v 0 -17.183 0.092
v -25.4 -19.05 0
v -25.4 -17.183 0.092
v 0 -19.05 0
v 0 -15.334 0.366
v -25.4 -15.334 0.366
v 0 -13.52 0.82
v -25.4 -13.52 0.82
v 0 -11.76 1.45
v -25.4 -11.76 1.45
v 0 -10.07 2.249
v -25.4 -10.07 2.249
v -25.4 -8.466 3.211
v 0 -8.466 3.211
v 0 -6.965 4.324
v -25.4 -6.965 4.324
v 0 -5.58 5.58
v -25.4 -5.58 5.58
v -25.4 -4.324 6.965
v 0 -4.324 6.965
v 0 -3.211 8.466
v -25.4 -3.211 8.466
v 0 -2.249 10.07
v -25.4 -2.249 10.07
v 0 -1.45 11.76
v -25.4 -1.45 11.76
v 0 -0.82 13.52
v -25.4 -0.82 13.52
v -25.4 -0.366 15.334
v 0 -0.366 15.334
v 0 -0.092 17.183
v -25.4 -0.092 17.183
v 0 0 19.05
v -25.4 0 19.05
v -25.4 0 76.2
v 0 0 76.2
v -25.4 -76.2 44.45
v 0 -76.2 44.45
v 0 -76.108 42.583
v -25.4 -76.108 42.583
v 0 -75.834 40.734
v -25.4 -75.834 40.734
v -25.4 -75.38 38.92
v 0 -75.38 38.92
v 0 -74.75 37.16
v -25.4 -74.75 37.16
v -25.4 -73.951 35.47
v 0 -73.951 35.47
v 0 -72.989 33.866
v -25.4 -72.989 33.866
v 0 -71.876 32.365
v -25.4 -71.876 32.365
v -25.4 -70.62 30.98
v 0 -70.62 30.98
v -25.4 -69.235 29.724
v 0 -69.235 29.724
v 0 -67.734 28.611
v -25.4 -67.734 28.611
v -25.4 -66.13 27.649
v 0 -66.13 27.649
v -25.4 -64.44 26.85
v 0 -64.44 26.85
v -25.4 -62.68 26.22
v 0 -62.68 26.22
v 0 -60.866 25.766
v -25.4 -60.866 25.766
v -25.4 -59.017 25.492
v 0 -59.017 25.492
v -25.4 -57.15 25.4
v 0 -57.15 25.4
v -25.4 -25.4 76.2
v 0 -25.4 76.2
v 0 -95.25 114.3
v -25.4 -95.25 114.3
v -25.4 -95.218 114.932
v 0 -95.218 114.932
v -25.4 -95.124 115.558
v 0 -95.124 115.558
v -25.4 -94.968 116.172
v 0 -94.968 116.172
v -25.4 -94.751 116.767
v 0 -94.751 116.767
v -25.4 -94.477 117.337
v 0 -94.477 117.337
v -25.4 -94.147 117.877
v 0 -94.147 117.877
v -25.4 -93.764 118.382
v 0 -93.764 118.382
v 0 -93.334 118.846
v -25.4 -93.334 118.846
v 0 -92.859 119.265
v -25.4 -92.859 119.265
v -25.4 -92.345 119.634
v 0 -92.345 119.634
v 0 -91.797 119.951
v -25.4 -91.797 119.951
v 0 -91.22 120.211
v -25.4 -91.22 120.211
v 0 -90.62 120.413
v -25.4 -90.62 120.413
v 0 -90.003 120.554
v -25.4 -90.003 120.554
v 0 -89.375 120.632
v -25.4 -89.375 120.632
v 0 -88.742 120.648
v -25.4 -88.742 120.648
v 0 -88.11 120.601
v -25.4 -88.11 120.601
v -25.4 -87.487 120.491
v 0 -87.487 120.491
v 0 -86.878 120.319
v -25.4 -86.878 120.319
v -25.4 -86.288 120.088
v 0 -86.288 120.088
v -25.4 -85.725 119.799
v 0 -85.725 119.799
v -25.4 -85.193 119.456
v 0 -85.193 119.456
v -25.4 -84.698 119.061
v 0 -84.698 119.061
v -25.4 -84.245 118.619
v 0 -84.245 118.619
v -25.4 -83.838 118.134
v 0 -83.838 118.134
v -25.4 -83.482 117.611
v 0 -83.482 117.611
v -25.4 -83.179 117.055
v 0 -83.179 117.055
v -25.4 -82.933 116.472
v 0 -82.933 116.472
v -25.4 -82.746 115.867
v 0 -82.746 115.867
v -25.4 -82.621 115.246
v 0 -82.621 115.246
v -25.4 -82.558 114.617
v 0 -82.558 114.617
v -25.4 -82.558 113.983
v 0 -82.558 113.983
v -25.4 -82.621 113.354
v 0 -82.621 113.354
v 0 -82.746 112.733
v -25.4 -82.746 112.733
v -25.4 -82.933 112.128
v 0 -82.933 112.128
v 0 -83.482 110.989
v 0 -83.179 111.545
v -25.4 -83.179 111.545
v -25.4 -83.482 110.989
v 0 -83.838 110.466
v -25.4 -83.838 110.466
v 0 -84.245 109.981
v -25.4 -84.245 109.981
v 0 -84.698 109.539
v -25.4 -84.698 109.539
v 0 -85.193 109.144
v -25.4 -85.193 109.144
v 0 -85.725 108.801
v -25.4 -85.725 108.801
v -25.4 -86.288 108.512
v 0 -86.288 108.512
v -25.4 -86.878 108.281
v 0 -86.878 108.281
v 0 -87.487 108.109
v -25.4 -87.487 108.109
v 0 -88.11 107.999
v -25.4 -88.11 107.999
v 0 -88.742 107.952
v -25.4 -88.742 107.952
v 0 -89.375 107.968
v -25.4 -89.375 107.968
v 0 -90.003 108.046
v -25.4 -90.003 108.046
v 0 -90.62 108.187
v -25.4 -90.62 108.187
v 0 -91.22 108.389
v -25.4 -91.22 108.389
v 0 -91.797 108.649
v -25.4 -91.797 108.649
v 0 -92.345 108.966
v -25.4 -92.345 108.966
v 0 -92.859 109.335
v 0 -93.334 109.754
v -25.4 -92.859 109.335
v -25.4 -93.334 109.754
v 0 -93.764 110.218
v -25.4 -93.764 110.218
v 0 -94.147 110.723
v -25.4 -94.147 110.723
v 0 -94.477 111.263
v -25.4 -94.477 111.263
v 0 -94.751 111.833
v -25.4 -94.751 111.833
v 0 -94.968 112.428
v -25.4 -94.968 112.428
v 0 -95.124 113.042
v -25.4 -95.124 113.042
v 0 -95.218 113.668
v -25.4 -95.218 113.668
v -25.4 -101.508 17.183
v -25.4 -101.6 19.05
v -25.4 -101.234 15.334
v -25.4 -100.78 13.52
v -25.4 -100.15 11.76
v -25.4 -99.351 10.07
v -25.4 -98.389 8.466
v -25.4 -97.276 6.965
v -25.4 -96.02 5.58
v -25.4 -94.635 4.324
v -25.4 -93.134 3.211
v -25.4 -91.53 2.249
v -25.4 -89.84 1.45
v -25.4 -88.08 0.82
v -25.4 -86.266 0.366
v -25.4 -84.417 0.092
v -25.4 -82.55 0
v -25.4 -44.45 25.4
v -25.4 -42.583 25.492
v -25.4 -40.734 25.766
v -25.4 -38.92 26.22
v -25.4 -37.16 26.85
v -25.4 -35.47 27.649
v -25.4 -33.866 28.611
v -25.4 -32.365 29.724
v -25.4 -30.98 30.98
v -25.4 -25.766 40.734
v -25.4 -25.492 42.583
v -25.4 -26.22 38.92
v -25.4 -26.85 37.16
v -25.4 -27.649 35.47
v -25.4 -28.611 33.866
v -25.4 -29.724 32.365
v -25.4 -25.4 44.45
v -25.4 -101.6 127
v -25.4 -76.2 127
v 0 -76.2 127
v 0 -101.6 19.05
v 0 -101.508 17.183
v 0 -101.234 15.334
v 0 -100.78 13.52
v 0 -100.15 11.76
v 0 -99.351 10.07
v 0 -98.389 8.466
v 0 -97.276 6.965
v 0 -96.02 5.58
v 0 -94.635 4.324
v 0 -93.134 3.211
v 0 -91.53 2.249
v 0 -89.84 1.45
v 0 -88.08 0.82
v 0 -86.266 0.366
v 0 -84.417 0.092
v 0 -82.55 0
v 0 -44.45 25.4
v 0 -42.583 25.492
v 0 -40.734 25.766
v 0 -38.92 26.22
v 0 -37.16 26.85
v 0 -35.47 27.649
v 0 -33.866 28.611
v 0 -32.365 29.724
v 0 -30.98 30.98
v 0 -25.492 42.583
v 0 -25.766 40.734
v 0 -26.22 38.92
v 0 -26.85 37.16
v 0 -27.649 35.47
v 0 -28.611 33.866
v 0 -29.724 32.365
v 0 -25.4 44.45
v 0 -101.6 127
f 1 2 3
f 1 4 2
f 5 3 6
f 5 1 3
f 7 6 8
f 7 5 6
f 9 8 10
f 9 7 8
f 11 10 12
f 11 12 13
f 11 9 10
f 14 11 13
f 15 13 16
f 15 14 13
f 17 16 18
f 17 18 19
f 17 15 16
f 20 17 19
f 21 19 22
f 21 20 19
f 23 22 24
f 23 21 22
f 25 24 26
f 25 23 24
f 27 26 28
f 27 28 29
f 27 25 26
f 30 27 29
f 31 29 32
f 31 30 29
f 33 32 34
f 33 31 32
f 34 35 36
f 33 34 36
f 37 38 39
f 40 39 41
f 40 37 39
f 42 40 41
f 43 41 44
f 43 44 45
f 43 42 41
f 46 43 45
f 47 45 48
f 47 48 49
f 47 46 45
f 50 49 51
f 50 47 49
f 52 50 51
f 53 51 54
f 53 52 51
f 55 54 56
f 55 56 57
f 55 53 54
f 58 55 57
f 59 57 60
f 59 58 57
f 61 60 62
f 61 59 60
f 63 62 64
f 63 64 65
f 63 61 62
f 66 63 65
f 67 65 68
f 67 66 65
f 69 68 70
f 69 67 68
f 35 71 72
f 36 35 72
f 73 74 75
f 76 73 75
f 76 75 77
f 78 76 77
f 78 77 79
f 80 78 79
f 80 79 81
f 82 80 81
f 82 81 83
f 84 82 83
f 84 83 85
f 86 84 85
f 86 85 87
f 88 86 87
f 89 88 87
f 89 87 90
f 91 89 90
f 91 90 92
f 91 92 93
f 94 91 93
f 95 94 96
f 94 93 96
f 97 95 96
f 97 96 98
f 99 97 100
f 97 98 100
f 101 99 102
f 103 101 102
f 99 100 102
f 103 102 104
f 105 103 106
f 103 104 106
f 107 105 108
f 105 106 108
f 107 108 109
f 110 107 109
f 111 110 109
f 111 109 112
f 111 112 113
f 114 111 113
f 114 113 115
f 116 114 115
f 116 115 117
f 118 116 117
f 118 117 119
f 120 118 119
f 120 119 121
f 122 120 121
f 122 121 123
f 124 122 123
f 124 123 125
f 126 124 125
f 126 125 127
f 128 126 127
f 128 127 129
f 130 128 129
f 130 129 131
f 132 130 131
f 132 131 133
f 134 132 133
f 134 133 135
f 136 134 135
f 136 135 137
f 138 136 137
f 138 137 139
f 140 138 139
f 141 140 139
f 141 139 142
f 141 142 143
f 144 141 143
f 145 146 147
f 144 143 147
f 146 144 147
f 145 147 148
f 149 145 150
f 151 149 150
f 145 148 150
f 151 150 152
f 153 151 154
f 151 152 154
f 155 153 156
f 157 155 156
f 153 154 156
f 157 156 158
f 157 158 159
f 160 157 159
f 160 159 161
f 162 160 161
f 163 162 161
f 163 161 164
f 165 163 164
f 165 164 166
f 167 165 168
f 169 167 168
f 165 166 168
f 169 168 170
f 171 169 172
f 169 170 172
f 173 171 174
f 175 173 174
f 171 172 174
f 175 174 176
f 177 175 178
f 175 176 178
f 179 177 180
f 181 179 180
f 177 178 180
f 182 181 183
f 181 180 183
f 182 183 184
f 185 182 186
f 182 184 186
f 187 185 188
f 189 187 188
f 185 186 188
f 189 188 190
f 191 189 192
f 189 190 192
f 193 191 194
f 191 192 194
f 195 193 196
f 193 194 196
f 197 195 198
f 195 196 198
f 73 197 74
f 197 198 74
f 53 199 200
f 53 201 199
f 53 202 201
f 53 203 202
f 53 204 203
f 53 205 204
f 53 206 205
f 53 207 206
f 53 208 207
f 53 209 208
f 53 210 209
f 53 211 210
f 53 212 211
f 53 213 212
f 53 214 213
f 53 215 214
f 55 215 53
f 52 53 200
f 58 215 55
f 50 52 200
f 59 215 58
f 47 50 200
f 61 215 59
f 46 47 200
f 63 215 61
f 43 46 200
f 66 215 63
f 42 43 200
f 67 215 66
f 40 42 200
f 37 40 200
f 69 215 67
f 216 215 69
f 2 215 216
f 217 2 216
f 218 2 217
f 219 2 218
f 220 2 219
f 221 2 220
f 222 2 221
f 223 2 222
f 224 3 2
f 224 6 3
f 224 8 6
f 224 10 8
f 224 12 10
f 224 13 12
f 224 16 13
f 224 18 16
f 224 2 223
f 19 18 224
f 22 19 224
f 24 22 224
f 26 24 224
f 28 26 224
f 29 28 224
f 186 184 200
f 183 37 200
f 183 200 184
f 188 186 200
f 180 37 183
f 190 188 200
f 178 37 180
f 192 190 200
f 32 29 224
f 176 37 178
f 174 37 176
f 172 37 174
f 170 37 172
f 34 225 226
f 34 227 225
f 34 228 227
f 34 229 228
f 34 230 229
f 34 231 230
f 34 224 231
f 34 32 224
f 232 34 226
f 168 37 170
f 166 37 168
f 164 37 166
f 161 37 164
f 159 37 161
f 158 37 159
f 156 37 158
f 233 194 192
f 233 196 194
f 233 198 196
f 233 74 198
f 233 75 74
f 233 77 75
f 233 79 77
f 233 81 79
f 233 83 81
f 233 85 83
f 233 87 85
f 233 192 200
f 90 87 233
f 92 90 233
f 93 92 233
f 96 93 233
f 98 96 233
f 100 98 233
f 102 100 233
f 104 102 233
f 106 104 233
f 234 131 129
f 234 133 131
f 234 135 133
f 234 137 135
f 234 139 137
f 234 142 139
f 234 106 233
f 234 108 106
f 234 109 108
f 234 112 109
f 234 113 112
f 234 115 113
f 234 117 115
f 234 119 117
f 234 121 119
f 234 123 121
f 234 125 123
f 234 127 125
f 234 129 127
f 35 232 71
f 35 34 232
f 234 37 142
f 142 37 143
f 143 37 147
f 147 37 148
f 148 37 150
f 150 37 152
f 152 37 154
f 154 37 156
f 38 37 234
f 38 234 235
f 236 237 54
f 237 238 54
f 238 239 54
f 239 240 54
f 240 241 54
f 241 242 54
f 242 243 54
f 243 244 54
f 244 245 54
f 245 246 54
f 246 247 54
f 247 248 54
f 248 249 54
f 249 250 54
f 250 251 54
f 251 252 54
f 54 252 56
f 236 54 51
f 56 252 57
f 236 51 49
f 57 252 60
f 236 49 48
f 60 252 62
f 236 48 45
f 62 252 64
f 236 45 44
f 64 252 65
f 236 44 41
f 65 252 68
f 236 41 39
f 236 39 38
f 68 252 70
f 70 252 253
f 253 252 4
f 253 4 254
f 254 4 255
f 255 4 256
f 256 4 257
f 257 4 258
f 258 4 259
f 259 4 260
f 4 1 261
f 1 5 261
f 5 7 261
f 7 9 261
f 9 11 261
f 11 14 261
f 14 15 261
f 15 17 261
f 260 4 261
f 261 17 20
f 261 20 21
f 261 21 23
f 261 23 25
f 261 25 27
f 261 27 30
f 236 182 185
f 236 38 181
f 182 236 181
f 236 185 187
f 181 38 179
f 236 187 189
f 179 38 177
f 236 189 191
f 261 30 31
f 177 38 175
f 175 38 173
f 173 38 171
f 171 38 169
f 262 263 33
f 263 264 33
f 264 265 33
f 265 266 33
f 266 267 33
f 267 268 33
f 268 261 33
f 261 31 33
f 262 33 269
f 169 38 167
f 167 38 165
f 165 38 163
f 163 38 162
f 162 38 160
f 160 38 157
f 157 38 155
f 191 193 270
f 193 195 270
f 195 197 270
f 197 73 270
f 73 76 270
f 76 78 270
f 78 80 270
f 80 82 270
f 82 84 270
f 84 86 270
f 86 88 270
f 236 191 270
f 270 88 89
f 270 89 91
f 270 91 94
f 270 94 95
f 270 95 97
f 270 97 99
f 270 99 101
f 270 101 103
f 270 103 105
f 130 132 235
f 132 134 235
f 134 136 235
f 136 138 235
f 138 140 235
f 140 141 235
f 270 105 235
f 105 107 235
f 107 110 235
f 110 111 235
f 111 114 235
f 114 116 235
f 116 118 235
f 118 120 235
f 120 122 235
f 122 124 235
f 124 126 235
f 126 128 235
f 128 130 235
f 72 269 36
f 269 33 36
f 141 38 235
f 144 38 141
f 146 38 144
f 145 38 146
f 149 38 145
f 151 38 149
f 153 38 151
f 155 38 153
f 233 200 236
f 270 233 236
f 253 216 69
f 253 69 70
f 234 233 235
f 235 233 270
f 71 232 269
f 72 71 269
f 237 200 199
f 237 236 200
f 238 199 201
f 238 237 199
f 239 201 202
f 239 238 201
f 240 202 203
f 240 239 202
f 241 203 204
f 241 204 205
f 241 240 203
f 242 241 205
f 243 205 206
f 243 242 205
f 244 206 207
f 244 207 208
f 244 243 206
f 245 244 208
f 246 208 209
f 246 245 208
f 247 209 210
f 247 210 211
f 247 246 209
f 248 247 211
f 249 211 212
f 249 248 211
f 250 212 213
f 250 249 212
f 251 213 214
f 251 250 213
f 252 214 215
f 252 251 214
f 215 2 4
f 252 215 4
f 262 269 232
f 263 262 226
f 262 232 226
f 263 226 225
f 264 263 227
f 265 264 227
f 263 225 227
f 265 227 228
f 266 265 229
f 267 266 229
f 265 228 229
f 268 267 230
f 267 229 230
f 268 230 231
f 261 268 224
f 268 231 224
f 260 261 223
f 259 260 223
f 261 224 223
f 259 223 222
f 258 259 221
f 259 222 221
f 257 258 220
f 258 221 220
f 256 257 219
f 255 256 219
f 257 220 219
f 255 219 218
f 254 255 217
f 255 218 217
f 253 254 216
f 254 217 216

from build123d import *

# Parameters (mm, degrees)
F0_W     = 25.4
F0_H     = 25.4
F1_DEPTH = 101.6
F2_W     = 25.4
F2_H     = 25.4
F3_DEPTH = 127
F4_W     = 25.4
F4_H     = 25.4
F5_DEPTH = 76.2
F7_D     = 12.7
F8_R     = 19.05
F9_R     = 19.05
F10_R    = 19.05
F11_R    = 19.05


with BuildPart() as f1:
    # F0 (on Front) → F1 (new body)
    with BuildSketch(Plane.XZ):
        with Locations((-12.7, 12.7)):
            Rectangle(F0_W, F0_H)
    extrude(amount=F1_DEPTH)

    # F2 (on face) → F3 (join)
    with BuildSketch(Plane(origin=(0, 0, 0), x_dir=(1, 0, 0), z_dir=(0, 0, -1))):
        with Locations((-12.7, 88.9)):
            Rectangle(F2_W, F2_H)
    extrude(amount=-F3_DEPTH)

    # F4 (on face) → F5 (join)
    with BuildSketch(Plane(origin=(0, 0, 0), x_dir=(1, 0, 0), z_dir=(0, 0, -1))):
        with Locations((-12.7, 12.7)):
            Rectangle(F4_W, F4_H)
    extrude(amount=-F5_DEPTH)

    # F7 (through all)
    with Locations(Plane.YZ):
        with Locations((-88.9, 114.3)):
            Hole(F7_D / 2)

    # F8
    f8_edges = [f1.edges().sort_by_distance(p)[0] for p in [
        (-12.7, -76.2, 25.4),
    ]]
    fillet(f8_edges, radius=F8_R)

    # F9
    f9_edges = [f1.edges().sort_by_distance(p)[0] for p in [
        (-12.7, -101.6, 0),
    ]]
    fillet(f9_edges, radius=F9_R)

    # F10
    f10_edges = [f1.edges().sort_by_distance(p)[0] for p in [
        (-12.7, 0, 0),
    ]]
    fillet(f10_edges, radius=F10_R)

    # F11
    f11_edges = [f1.edges().sort_by_distance(p)[0] for p in [
        (-12.7, -25.4, 25.4),
    ]]
    fillet(f11_edges, radius=F11_R)


solid = f1.part
